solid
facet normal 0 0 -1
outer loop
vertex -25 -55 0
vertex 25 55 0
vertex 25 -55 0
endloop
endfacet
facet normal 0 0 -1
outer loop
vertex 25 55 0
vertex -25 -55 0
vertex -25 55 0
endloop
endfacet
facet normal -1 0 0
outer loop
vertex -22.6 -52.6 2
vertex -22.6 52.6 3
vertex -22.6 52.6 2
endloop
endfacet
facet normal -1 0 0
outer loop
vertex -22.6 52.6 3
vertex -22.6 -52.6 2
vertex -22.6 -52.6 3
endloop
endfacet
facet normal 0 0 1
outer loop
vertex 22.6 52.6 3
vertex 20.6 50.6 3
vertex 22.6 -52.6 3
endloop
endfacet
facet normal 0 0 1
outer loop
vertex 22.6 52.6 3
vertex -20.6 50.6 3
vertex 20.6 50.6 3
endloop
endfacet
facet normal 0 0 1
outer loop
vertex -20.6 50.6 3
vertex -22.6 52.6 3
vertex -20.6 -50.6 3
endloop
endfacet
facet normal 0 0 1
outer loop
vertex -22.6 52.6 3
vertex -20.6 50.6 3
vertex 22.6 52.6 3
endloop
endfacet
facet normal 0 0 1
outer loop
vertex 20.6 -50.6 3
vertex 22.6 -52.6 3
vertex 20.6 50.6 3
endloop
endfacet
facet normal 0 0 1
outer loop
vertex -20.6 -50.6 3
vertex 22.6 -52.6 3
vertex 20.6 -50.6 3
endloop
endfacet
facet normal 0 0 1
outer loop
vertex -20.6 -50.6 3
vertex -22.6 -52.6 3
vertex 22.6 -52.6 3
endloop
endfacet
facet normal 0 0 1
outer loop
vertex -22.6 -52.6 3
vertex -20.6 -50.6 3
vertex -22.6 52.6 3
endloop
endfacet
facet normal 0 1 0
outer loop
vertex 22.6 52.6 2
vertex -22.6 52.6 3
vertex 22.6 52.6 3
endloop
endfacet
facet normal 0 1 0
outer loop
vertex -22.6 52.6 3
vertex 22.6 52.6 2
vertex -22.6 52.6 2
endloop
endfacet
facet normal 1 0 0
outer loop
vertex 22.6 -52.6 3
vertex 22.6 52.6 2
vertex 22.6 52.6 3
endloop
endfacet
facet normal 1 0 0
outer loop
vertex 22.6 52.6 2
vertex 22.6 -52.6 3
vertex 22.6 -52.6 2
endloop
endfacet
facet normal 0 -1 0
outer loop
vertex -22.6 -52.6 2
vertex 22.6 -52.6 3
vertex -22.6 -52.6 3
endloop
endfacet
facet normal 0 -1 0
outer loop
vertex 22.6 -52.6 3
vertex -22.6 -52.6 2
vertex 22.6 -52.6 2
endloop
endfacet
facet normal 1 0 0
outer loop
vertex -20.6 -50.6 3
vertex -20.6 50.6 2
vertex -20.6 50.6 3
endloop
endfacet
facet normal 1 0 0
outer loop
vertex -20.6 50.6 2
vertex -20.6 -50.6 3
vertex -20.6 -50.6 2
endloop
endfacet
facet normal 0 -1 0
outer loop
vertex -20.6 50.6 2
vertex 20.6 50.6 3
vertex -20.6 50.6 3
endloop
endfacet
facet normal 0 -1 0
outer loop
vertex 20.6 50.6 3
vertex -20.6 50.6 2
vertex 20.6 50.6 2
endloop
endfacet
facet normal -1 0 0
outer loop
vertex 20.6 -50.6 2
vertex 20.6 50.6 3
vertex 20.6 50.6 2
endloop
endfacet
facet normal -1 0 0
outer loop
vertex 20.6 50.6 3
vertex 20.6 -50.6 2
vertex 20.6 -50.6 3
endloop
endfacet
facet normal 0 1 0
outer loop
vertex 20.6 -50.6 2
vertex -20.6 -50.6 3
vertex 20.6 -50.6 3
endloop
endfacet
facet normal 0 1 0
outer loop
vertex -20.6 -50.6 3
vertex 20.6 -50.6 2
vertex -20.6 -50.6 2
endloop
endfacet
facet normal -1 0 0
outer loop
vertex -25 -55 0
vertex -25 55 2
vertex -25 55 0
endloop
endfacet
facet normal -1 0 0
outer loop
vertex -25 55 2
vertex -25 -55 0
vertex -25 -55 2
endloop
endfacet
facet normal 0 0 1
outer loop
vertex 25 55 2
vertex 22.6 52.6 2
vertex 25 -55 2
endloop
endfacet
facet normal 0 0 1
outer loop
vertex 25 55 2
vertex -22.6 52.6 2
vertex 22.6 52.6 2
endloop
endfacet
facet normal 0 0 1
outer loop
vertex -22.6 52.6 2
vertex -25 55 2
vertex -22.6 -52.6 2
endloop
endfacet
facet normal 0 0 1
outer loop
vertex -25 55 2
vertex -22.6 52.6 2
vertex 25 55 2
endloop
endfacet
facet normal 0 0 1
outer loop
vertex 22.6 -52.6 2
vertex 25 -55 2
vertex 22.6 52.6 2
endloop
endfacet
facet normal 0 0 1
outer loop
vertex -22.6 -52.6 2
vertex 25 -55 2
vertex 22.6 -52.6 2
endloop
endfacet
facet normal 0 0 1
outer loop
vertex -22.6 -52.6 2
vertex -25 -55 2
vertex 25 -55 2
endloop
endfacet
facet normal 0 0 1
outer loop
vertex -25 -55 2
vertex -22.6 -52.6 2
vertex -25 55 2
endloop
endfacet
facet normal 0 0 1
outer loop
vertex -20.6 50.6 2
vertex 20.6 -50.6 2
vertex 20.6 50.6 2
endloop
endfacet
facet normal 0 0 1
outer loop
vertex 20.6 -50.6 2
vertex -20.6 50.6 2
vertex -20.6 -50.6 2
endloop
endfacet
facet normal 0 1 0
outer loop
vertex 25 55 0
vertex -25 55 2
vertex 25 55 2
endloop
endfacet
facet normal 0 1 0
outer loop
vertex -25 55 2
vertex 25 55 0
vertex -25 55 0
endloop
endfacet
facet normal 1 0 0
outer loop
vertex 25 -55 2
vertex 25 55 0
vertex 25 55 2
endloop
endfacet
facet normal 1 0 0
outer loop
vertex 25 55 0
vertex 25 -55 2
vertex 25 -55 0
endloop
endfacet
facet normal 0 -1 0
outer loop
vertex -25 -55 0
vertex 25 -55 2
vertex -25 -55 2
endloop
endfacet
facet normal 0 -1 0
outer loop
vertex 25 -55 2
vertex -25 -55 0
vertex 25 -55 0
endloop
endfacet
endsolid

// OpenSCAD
// file: vars.scad
echo(version=version());
//All dimensions are in mm


BatBox=[[68,110.0],[50,110.0], [86.0,110.0]];
voltMeterXOffset = [0.0, -5.0, -2,0];
batteryHolder3s=[68,110.0];
batteryHolder2s=[50,106.0];
h=32;    // height of box without lid
wall=2;  // wall thickness
postloc=28; // where the edge posts are in y direction
postsize=[1.85,3] ;  //Dimension of posts in x and y
basethickness=3;
holdslotloc=81.5;
holdslotwidth=10;
wireholddiameter = 5.0;
switchcutout = [13.7, 9.2];
switchDepth = 16.0;
//Perforation size: 23mm*10.5mm
voltMeterCutout=[24,11.5];
// Allow for slip by making the ridge a little smaller than the box it fits into.
interference=0.8;
Usb15=[17.2,12.1];
usbCPortStandoff=2.0;
usbConnector=[10,7.0,4.2];
circuitBoardThick=2.0;

Usb15Package=[Usb15.x+usbCPortStandoff, Usb15.y,circuitBoardThick+usbConnector.z];
// main file
//Cover with a slot for the wire egress
//All dimensions are in mm
// combo box for string
BatBoxSize=1; // [0:3S, 1:2S, 2:4S]

// Create the exterior box, subtract the interior, and subtract the slot.

include <vars.scad>;
translate ([0,0,0])
linear_extrude(height = wall)
            square([BatBox[BatBoxSize].x, BatBox[BatBoxSize].y
            ], center = true);
 // now the inside rim is another box minus a other box...
 //  taking into account that we need to give some slip fit with the interference parameter
difference() {
    linear_extrude(height = basethickness)
            square([BatBox[BatBoxSize].x-2*wall-interference, BatBox[BatBoxSize].y-2*wall-interference
            ], center = true);
    translate ([0,0,0])
    linear_extrude(height = basethickness)
            square([BatBox[BatBoxSize].x-4*wall-interference, BatBox[BatBoxSize].y-4*wall-interference
            ], center = true);
}
